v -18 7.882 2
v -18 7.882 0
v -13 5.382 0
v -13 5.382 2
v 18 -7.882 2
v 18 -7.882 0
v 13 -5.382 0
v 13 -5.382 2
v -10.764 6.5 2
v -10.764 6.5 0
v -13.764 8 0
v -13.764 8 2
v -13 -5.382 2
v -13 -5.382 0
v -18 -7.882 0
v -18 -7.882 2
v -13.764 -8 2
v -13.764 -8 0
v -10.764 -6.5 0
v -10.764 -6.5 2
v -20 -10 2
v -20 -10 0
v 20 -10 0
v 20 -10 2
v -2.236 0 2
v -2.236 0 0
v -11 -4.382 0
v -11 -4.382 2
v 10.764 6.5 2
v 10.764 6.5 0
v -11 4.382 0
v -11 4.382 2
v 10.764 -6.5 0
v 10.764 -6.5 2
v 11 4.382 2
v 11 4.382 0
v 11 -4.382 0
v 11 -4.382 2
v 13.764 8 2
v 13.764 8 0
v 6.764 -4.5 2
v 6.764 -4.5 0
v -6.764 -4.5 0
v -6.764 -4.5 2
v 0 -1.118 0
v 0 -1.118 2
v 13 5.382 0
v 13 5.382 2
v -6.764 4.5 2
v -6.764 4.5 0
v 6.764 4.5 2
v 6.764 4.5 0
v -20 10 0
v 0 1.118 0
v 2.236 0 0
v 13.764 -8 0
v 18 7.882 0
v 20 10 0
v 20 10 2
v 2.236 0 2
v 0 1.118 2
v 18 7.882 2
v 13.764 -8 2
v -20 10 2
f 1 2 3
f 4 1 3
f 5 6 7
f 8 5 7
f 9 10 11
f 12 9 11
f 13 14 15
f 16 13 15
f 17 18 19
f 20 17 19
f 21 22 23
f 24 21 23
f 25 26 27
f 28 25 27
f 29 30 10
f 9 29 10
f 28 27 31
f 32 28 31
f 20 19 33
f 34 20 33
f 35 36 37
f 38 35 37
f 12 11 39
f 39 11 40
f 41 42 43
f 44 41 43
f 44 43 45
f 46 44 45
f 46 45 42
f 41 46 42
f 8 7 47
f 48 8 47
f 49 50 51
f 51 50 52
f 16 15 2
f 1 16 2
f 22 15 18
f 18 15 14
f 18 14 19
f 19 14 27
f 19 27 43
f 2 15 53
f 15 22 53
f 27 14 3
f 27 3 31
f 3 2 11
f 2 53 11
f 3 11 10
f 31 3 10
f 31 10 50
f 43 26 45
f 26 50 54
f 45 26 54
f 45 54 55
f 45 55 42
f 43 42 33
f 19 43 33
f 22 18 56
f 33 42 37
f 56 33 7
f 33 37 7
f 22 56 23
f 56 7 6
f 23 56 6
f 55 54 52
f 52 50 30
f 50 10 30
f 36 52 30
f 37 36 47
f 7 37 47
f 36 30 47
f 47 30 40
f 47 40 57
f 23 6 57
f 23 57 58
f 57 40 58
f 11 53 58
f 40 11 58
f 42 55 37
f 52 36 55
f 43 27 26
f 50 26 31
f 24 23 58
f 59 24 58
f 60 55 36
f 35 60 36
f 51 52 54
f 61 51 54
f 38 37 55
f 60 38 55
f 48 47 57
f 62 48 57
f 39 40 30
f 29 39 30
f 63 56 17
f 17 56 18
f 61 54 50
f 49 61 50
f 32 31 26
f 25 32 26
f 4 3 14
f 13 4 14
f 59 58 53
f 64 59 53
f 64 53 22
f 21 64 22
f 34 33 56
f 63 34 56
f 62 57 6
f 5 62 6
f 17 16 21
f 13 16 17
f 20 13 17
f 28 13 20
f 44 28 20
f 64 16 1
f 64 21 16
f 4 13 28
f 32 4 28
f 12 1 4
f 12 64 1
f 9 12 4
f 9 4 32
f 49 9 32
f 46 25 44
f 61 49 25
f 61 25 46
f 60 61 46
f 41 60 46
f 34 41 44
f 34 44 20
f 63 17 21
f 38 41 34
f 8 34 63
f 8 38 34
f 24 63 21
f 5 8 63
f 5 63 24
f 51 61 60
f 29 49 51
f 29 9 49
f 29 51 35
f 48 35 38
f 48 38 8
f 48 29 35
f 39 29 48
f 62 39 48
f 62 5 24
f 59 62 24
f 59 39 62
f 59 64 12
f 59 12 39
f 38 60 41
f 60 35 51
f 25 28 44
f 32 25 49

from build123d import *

# Parameters (mm, degrees)
F2_DEPTH = 2


with BuildPart() as f2:
    # F1 (on Top) → F2 (new body)
    with BuildSketch(Plane.XY):
        Polygon((17.7639320225, 10), (-17.7639320225, 10), (-13.7639320225, 8), (13.7639320225, 8), align=None)
        Polygon((10.7639320225, 6.5), (-10.7639320225, 6.5), (-6.7639320225, 4.5), (6.7639320225, 4.5), align=None)
        Polygon((-18, 7.8819660113), (-20, 8.8819660113), (-20, -8.8819660113), (-18, -7.8819660113), align=None)
        Polygon((-11, 4.3819660113), (-13, 5.3819660113), (-13, -5.3819660113), (-11, -4.3819660113), align=None)
        Polygon((-2.2360679775, 0), (-11, -4.3819660113), (-11, -4.5), (-6.7639320225, -4.5), (0, -1.1180339887), align=None)
        Polygon((20, -8.8819660113), (20, 8.8819660113), (18, 7.8819660113), (18, -7.8819660113), align=None)
        Polygon((11, -4.3819660113), (2.2360679775, 0), (0, -1.1180339887), (6.7639320225, -4.5), (11, -4.5), align=None)
        Polygon((11, 4.5), (6.7639320225, 4.5), (0, 1.1180339887), (2.2360679775, 0), (11, 4.3819660113), align=None)
        Polygon((-17.7639320225, 10), (-20, 10), (-20, 8.8819660113), (-18, 7.8819660113), (-18, 8), (-13.7639320225, 8), align=None)
        Polygon((-10.7639320225, 6.5), (-13.7639320225, 8), (-18, 8), (-18, 7.8819660113), (-13, 5.3819660113), (-13, 6.5), align=None)
        Polygon((-6.7639320225, 4.5), (-10.7639320225, 6.5), (-13, 6.5), (-13, 5.3819660113), (-11, 4.3819660113), (-11, 4.5), align=None)
        Polygon((20, 10), (17.7639320225, 10), (13.7639320225, 8), (18, 8), (18, 7.8819660113), (20, 8.8819660113), align=None)
        Polygon((18, 8), (13.7639320225, 8), (10.7639320225, 6.5), (13, 6.5), (13, 5.3819660113), (18, 7.8819660113), align=None)
        Polygon((13, 6.5), (10.7639320225, 6.5), (6.7639320225, 4.5), (11, 4.5), (11, 4.3819660113), (13, 5.3819660113), align=None)
        Polygon((2.2360679775, 0), (0, 1.1180339887), (-2.2360679775, 0), (0, -1.1180339887), align=None)
        Polygon((0, 1.1180339887), (-6.7639320225, 4.5), (-11, 4.5), (-11, 4.3819660113), (-2.2360679775, 0), align=None)
        Polygon((-11, -4.3819660113), (-13, -5.3819660113), (-13, -6.5), (-10.7639320225, -6.5), (-6.7639320225, -4.5), (-11, -4.5), align=None)
        Polygon((-13, -5.3819660113), (-18, -7.8819660113), (-18, -8), (-13.7639320225, -8), (-10.7639320225, -6.5), (-13, -6.5), align=None)
        Polygon((-18, -7.8819660113), (-20, -8.8819660113), (-20, -10), (-17.7639320225, -10), (-13.7639320225, -8), (-18, -8), align=None)
        Polygon((-13.7639320225, -8), (-17.7639320225, -10), (17.7639320225, -10), (13.7639320225, -8), align=None)
        Polygon((20, -10), (20, -8.8819660113), (18, -7.8819660113), (18, -8), (13.7639320225, -8), (17.7639320225, -10), align=None)
        Polygon((18, -8), (18, -7.8819660113), (13, -5.3819660113), (13, -6.5), (10.7639320225, -6.5), (13.7639320225, -8), align=None)
        Polygon((13, -6.5), (13, -5.3819660113), (11, -4.3819660113), (11, -4.5), (6.7639320225, -4.5), (10.7639320225, -6.5), align=None)
        Polygon((-6.7639320225, -4.5), (-10.7639320225, -6.5), (10.7639320225, -6.5), (6.7639320225, -4.5), align=None)
        Polygon((13, -5.3819660113), (13, 5.3819660113), (11, 4.3819660113), (11, -4.3819660113), align=None)
    extrude(amount=F2_DEPTH)


solid = f2.part
